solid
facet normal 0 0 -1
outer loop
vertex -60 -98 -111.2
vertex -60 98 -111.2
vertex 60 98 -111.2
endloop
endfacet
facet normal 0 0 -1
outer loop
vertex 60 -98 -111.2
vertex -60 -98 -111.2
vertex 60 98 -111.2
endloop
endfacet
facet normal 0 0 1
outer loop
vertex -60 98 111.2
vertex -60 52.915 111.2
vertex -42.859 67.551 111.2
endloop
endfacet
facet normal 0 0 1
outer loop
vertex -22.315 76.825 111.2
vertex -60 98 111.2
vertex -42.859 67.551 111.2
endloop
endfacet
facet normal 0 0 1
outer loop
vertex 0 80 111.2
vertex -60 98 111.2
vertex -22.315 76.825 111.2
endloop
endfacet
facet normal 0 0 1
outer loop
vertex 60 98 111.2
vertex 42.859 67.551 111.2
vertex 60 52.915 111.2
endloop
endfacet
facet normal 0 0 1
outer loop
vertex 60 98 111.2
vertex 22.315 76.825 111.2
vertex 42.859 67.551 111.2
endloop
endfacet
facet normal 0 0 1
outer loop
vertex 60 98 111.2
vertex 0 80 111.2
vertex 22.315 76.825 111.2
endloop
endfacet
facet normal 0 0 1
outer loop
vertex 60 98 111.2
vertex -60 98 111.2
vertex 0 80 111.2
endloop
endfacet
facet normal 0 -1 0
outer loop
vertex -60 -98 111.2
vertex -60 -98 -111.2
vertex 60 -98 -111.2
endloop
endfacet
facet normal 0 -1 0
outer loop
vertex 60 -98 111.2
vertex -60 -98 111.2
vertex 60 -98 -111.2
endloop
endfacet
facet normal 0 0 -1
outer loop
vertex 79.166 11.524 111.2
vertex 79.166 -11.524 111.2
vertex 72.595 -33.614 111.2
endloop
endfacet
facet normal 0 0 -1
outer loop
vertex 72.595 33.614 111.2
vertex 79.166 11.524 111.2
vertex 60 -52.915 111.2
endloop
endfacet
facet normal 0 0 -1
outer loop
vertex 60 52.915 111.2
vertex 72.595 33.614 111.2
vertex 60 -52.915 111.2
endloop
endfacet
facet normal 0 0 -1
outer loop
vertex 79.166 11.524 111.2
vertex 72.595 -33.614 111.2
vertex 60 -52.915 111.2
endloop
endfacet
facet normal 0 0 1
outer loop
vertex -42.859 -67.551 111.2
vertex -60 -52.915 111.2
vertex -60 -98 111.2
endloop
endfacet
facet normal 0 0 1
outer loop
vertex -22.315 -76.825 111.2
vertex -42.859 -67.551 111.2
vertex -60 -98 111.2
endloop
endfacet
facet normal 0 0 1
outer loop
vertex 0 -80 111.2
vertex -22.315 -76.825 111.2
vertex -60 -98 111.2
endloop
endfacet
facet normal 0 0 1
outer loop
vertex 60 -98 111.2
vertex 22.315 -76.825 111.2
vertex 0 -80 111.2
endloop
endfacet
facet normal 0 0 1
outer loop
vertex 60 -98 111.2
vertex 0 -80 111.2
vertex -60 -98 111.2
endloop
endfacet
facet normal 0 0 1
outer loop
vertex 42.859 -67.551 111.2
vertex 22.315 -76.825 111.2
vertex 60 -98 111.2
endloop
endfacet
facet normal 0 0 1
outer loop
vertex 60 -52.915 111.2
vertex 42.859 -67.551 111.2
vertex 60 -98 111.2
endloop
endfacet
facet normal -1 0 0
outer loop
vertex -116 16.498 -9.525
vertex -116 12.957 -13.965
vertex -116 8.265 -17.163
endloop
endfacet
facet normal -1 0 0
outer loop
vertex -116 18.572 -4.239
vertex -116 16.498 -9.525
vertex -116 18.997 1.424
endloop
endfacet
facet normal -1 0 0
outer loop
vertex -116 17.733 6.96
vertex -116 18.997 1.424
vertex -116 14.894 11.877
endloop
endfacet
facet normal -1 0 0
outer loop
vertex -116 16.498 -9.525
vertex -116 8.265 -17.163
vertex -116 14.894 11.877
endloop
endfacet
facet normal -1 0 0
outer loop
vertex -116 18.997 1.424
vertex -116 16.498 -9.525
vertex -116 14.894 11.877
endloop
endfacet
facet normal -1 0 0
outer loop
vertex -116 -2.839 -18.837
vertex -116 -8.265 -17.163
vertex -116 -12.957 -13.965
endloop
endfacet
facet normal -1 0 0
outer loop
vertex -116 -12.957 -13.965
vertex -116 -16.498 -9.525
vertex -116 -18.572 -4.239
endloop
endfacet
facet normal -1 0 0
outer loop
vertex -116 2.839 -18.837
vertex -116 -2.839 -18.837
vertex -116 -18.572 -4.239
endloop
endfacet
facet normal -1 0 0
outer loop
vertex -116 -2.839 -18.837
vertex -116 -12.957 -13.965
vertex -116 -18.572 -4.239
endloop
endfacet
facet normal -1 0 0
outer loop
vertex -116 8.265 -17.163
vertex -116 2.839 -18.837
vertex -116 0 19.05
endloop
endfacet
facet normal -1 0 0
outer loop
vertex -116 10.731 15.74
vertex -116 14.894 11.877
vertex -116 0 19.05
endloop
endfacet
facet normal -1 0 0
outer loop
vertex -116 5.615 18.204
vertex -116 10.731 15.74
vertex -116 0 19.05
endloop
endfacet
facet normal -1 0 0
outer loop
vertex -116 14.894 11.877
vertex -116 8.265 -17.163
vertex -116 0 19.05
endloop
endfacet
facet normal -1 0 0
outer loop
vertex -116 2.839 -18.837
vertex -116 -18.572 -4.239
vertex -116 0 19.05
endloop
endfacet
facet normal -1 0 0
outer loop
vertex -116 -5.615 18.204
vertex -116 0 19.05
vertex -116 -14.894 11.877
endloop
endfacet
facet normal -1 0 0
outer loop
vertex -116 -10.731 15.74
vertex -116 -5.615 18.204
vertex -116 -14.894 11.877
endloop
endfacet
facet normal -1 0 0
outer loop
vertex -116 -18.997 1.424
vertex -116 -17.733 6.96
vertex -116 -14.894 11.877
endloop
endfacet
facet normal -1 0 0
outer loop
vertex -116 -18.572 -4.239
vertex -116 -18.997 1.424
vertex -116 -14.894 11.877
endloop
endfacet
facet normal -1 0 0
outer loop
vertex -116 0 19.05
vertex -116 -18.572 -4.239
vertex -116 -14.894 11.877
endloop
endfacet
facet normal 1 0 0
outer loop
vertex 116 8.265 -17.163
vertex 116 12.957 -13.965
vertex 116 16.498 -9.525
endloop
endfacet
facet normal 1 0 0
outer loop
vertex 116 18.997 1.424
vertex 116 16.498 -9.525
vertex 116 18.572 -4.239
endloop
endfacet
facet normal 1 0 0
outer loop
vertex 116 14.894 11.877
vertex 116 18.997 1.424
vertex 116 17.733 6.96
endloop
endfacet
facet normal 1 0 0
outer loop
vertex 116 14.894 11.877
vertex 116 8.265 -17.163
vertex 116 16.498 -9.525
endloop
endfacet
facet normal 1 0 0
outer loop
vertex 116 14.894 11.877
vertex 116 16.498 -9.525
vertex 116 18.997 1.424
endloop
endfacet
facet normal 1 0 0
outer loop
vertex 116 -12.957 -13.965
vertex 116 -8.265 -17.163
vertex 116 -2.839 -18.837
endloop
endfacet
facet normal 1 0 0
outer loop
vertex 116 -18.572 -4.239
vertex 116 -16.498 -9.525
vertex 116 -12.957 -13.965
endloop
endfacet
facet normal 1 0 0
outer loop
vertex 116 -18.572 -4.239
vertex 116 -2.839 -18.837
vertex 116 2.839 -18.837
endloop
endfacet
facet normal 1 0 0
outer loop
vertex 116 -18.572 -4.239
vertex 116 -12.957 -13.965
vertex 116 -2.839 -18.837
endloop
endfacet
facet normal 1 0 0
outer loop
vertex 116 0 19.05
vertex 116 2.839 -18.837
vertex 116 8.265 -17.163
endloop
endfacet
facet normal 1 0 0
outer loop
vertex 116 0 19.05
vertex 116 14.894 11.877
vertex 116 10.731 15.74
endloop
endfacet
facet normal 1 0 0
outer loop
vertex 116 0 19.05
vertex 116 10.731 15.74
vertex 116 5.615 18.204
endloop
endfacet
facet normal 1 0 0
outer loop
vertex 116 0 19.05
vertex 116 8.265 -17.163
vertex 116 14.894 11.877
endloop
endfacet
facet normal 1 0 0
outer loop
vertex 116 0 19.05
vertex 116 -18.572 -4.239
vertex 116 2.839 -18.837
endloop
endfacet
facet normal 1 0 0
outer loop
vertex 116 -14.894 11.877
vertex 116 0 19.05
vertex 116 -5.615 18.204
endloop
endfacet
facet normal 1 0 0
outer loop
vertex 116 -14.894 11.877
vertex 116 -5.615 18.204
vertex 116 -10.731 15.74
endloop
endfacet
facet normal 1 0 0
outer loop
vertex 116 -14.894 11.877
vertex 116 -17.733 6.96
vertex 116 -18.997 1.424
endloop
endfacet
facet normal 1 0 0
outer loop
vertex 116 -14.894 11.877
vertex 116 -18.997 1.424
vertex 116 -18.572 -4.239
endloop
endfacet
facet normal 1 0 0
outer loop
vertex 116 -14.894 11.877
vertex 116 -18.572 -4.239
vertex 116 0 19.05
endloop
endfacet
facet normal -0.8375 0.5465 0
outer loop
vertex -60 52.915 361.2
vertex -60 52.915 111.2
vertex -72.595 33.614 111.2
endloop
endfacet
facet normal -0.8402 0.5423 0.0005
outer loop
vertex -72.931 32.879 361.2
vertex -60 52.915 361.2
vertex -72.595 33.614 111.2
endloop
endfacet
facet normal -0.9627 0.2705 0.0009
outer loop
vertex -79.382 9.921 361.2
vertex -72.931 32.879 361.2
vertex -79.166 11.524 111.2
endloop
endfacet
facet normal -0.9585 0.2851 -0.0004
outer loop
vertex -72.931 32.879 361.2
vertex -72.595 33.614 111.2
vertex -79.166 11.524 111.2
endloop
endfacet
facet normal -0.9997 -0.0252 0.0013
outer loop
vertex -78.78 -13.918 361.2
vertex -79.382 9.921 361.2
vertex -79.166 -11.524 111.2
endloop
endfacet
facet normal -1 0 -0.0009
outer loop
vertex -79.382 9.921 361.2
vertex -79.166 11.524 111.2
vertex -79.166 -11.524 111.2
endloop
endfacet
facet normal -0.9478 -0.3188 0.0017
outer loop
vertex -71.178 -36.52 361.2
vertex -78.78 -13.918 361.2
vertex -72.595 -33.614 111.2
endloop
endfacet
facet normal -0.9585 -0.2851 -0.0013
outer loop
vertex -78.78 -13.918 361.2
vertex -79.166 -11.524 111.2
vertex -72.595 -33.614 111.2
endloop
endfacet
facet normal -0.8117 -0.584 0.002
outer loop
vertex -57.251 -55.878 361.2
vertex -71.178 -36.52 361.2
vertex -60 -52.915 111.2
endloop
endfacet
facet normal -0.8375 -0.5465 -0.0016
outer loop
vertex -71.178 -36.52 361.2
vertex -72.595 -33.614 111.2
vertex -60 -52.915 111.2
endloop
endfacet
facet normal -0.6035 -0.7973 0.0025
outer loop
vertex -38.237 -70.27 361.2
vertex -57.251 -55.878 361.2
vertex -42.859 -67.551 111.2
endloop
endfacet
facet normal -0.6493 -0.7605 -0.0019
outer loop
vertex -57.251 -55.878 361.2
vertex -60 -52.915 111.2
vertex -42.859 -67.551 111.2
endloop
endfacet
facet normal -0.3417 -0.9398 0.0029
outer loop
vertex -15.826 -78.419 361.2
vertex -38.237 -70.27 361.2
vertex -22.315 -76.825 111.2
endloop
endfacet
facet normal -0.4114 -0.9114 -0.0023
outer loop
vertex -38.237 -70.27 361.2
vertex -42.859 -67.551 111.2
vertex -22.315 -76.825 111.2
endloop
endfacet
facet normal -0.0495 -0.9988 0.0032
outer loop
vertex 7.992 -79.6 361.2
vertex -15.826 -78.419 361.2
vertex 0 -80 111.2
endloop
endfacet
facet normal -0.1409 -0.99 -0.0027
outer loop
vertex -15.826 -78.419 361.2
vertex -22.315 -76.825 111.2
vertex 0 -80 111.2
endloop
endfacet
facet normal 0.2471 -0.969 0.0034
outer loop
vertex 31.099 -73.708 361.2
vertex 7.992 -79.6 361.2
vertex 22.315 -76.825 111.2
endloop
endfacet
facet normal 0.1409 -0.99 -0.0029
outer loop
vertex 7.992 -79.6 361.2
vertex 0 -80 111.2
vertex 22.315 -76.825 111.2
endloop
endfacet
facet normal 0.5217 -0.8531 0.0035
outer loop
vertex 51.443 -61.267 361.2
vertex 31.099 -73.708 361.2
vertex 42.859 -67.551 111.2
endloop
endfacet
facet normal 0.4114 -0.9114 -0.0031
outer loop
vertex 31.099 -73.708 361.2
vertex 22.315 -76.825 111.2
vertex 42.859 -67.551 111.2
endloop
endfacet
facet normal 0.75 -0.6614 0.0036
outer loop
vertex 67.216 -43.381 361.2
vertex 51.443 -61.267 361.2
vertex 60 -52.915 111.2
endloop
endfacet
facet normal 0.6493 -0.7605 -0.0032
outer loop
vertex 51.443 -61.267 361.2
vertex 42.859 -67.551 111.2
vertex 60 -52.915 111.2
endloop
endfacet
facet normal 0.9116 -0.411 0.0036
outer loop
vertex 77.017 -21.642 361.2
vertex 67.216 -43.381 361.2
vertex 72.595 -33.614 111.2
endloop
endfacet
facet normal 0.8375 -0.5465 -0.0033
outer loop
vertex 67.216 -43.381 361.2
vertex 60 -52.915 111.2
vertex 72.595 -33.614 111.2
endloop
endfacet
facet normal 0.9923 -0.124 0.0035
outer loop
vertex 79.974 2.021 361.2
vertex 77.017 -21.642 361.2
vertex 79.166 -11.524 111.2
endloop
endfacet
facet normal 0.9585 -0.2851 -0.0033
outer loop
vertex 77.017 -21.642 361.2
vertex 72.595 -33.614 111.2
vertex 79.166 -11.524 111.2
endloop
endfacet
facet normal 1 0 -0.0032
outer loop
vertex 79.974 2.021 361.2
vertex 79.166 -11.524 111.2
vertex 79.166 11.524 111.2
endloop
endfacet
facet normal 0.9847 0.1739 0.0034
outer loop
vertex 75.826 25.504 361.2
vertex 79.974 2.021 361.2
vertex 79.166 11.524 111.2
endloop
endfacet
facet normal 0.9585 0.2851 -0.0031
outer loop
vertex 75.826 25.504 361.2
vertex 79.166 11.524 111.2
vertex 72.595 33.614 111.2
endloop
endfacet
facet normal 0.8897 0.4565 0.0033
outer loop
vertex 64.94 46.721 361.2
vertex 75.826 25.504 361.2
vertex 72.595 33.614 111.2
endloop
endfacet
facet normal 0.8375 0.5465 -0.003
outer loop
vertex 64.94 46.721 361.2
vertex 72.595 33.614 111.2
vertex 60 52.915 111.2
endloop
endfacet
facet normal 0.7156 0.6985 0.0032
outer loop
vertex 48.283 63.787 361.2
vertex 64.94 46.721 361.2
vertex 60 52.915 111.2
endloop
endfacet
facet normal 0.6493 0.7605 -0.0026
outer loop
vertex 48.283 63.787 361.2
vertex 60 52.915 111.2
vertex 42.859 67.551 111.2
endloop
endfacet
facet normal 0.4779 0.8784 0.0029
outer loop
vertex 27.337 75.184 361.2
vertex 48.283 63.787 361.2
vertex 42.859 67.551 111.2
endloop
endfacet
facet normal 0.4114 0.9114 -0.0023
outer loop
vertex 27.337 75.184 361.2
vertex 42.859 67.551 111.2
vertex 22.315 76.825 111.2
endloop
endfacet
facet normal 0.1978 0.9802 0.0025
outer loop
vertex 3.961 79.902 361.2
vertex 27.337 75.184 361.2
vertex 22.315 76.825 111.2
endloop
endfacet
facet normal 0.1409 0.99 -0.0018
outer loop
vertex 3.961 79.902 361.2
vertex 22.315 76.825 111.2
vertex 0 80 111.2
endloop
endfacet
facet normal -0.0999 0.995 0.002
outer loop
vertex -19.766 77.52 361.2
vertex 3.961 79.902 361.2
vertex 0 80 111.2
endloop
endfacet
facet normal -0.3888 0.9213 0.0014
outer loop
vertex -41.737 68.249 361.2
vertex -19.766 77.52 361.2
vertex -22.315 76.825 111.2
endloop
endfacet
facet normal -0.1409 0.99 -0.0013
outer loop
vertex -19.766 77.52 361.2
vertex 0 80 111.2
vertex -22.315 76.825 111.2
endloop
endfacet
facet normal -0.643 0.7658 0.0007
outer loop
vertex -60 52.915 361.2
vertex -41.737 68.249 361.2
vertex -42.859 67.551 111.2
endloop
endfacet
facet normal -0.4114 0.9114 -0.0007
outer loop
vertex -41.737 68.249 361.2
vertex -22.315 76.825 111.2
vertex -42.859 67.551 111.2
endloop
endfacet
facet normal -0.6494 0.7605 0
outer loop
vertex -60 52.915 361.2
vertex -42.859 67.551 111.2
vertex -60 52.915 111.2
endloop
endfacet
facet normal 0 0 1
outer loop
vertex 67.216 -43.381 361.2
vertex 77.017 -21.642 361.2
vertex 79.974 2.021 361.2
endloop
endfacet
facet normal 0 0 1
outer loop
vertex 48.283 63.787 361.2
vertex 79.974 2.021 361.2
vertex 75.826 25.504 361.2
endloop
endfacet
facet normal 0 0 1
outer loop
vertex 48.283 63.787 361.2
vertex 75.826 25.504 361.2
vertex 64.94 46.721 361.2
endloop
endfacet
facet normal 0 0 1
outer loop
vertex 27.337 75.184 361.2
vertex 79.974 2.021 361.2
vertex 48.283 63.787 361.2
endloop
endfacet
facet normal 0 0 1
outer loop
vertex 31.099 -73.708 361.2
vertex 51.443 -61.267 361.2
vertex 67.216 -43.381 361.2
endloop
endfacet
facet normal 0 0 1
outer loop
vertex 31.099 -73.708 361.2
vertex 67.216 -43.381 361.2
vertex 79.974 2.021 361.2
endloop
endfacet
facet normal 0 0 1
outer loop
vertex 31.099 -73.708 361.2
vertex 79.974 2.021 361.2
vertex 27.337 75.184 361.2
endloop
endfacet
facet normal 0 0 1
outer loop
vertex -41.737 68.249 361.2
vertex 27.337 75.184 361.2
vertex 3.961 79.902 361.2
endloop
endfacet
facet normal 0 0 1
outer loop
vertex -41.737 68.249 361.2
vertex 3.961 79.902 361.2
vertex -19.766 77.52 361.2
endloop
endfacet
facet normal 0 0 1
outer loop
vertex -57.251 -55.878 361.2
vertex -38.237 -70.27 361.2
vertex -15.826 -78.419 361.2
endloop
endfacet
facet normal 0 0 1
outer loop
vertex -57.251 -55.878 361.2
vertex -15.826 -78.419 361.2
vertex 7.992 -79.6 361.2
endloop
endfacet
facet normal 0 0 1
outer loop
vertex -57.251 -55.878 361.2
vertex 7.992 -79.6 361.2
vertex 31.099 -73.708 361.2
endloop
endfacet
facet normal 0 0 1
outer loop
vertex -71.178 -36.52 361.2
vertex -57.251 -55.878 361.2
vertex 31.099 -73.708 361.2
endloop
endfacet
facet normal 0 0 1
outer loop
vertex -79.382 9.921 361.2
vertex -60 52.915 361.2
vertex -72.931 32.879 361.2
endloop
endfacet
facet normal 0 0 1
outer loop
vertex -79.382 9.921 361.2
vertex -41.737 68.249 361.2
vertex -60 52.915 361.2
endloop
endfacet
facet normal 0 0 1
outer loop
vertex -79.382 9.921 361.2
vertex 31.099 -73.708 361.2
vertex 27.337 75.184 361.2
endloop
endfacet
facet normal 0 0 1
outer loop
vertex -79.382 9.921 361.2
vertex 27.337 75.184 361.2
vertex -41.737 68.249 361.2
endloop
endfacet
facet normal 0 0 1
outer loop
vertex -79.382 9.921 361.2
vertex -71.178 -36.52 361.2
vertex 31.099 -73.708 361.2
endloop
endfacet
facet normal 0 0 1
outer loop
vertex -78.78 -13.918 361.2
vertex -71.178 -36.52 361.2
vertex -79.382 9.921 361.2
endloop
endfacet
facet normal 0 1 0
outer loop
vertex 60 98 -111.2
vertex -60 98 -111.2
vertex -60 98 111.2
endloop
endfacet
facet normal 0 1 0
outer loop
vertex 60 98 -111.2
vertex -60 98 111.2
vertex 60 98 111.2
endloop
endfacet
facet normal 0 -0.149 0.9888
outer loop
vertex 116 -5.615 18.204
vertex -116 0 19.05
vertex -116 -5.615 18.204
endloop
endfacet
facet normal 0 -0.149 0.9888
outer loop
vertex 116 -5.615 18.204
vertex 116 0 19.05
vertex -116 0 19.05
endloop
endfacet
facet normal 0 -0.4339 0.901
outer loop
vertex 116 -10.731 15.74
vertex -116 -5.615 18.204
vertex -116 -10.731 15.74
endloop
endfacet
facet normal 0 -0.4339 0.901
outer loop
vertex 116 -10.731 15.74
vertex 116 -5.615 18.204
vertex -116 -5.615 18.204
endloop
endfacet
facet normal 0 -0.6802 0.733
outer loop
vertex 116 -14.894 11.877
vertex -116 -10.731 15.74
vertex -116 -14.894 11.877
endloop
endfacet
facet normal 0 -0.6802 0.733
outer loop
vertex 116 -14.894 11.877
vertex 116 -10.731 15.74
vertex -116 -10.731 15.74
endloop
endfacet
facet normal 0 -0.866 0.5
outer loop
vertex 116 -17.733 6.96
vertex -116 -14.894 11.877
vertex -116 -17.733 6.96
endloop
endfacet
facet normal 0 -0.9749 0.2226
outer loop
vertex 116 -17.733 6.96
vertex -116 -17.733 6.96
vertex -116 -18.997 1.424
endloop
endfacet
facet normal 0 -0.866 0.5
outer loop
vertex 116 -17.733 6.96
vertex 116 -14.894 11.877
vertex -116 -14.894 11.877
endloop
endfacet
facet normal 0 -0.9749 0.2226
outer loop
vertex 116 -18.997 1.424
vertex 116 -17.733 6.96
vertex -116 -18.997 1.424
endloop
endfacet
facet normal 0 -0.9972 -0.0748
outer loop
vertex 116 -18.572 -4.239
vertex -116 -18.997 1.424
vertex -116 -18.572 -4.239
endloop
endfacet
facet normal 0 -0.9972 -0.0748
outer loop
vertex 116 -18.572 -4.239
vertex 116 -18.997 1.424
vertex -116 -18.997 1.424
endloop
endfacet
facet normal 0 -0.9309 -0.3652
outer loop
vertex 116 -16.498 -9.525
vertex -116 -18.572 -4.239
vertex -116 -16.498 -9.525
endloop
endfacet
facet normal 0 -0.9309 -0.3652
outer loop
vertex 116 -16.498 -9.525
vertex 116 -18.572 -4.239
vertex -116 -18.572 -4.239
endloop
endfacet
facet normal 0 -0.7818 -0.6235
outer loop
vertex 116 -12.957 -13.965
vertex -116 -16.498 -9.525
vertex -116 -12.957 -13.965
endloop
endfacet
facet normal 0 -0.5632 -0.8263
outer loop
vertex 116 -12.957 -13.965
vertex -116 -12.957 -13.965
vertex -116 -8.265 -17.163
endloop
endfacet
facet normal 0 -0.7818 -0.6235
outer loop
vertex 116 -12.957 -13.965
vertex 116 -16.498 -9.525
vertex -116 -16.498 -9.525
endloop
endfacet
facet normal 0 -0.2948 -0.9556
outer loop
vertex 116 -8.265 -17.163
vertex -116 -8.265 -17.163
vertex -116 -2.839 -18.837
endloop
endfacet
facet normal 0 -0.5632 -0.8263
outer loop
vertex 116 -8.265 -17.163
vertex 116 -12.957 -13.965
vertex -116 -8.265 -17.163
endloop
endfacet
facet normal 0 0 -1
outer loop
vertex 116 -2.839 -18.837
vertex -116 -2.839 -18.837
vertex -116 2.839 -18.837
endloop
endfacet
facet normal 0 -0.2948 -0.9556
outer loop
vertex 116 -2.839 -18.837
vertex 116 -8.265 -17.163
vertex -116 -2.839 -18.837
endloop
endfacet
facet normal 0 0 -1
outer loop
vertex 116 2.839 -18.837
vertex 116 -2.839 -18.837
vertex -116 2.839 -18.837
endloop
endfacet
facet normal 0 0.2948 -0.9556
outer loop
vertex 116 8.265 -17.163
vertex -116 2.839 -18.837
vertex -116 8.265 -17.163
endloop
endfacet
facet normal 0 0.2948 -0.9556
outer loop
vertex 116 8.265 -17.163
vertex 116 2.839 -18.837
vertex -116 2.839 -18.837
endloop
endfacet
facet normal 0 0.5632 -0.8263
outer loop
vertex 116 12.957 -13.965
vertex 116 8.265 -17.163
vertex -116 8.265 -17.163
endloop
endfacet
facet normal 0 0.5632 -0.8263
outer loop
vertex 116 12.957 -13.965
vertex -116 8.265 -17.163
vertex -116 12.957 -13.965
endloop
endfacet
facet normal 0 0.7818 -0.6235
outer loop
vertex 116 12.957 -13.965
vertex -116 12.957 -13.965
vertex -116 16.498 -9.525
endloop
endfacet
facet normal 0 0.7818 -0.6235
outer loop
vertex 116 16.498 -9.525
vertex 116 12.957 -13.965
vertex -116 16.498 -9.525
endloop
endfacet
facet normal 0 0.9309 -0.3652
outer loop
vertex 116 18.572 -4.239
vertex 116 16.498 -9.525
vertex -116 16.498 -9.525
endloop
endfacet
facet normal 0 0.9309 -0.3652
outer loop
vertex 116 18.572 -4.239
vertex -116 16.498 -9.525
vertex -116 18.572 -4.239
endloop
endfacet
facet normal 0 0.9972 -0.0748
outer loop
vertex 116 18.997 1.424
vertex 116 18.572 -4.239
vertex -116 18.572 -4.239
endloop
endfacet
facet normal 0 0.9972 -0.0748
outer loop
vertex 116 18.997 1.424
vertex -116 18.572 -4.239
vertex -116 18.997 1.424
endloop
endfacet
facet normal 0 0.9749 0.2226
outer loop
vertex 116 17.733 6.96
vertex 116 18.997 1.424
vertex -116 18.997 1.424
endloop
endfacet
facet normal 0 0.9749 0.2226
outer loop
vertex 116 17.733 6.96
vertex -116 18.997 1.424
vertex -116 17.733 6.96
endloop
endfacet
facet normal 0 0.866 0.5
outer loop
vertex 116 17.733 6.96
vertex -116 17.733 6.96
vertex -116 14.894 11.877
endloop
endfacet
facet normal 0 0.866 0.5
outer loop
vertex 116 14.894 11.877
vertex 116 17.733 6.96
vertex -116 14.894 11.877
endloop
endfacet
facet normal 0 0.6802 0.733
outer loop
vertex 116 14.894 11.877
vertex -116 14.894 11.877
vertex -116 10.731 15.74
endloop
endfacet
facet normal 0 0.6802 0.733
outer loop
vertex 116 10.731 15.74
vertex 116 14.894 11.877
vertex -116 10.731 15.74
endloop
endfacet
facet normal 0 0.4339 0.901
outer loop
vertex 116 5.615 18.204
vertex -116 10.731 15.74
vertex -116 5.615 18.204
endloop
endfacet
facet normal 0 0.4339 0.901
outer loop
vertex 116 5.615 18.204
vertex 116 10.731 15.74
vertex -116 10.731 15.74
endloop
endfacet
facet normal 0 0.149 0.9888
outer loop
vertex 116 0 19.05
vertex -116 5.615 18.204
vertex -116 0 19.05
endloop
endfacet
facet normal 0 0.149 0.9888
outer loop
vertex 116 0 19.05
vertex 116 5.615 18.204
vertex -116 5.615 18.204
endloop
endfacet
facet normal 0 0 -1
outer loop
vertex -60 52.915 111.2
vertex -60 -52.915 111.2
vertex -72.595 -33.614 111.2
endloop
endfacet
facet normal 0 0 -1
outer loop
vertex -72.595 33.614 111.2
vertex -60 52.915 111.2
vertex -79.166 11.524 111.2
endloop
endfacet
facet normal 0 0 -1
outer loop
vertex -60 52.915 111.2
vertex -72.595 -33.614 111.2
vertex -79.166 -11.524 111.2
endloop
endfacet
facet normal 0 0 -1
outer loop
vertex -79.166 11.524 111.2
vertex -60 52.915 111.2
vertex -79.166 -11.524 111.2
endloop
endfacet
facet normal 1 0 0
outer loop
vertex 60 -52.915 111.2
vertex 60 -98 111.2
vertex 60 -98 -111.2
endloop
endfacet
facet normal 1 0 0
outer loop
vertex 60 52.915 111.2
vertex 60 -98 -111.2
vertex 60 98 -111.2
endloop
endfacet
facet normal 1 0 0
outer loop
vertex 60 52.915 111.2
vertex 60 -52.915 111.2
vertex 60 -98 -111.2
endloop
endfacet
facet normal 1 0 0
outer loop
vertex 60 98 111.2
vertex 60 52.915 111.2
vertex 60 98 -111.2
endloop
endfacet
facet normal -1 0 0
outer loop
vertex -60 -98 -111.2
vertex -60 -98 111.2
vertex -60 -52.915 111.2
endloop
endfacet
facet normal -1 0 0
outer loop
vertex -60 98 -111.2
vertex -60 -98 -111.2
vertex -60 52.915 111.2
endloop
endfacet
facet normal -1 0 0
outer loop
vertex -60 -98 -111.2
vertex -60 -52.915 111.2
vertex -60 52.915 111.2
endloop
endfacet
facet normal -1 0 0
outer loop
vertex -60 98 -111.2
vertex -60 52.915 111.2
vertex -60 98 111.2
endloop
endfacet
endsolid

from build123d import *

# Parameters (mm, degrees)
CROQUIS1_W              = 120
CROQUIS1_H              = 196
SALIENTE_EXTRUIR1_DEPTH = 111.2
CROQUIS2_R              = 19.05
SALIENTE_EXTRUIR2_DEPTH = 116
CROQUIS3_R              = 80
SALIENTE_EXTRUIR3_DEPTH = 250


with BuildPart() as part:
    # Croquis1 → Saliente-Extruir1 (new, symmetric)
    with BuildSketch(Plane.XY):
        Rectangle(CROQUIS1_W, CROQUIS1_H)
    extrude(amount=SALIENTE_EXTRUIR1_DEPTH, both=True)

    # Croquis3 → Saliente-Extruir3 (add)
    with BuildSketch(Plane.XY.offset(111.2)):
        with Locations(Location((0, 0, 0), (0, 0, 138.590377891))):
            Circle(CROQUIS3_R)
    extrude(amount=SALIENTE_EXTRUIR3_DEPTH)


with BuildPart() as body_2:
    # Croquis2 → Saliente-Extruir2 (new, symmetric)
    with BuildSketch(Plane(origin=(0, 0, 0), x_dir=(0, 0, -1), z_dir=(1, 0, 0))):
        with Locations(Location((0, 0, 0), (0, 0, 180))):
            Circle(CROQUIS2_R)
    extrude(amount=SALIENTE_EXTRUIR2_DEPTH, both=True)


solid = Compound([part.part, body_2.part])
